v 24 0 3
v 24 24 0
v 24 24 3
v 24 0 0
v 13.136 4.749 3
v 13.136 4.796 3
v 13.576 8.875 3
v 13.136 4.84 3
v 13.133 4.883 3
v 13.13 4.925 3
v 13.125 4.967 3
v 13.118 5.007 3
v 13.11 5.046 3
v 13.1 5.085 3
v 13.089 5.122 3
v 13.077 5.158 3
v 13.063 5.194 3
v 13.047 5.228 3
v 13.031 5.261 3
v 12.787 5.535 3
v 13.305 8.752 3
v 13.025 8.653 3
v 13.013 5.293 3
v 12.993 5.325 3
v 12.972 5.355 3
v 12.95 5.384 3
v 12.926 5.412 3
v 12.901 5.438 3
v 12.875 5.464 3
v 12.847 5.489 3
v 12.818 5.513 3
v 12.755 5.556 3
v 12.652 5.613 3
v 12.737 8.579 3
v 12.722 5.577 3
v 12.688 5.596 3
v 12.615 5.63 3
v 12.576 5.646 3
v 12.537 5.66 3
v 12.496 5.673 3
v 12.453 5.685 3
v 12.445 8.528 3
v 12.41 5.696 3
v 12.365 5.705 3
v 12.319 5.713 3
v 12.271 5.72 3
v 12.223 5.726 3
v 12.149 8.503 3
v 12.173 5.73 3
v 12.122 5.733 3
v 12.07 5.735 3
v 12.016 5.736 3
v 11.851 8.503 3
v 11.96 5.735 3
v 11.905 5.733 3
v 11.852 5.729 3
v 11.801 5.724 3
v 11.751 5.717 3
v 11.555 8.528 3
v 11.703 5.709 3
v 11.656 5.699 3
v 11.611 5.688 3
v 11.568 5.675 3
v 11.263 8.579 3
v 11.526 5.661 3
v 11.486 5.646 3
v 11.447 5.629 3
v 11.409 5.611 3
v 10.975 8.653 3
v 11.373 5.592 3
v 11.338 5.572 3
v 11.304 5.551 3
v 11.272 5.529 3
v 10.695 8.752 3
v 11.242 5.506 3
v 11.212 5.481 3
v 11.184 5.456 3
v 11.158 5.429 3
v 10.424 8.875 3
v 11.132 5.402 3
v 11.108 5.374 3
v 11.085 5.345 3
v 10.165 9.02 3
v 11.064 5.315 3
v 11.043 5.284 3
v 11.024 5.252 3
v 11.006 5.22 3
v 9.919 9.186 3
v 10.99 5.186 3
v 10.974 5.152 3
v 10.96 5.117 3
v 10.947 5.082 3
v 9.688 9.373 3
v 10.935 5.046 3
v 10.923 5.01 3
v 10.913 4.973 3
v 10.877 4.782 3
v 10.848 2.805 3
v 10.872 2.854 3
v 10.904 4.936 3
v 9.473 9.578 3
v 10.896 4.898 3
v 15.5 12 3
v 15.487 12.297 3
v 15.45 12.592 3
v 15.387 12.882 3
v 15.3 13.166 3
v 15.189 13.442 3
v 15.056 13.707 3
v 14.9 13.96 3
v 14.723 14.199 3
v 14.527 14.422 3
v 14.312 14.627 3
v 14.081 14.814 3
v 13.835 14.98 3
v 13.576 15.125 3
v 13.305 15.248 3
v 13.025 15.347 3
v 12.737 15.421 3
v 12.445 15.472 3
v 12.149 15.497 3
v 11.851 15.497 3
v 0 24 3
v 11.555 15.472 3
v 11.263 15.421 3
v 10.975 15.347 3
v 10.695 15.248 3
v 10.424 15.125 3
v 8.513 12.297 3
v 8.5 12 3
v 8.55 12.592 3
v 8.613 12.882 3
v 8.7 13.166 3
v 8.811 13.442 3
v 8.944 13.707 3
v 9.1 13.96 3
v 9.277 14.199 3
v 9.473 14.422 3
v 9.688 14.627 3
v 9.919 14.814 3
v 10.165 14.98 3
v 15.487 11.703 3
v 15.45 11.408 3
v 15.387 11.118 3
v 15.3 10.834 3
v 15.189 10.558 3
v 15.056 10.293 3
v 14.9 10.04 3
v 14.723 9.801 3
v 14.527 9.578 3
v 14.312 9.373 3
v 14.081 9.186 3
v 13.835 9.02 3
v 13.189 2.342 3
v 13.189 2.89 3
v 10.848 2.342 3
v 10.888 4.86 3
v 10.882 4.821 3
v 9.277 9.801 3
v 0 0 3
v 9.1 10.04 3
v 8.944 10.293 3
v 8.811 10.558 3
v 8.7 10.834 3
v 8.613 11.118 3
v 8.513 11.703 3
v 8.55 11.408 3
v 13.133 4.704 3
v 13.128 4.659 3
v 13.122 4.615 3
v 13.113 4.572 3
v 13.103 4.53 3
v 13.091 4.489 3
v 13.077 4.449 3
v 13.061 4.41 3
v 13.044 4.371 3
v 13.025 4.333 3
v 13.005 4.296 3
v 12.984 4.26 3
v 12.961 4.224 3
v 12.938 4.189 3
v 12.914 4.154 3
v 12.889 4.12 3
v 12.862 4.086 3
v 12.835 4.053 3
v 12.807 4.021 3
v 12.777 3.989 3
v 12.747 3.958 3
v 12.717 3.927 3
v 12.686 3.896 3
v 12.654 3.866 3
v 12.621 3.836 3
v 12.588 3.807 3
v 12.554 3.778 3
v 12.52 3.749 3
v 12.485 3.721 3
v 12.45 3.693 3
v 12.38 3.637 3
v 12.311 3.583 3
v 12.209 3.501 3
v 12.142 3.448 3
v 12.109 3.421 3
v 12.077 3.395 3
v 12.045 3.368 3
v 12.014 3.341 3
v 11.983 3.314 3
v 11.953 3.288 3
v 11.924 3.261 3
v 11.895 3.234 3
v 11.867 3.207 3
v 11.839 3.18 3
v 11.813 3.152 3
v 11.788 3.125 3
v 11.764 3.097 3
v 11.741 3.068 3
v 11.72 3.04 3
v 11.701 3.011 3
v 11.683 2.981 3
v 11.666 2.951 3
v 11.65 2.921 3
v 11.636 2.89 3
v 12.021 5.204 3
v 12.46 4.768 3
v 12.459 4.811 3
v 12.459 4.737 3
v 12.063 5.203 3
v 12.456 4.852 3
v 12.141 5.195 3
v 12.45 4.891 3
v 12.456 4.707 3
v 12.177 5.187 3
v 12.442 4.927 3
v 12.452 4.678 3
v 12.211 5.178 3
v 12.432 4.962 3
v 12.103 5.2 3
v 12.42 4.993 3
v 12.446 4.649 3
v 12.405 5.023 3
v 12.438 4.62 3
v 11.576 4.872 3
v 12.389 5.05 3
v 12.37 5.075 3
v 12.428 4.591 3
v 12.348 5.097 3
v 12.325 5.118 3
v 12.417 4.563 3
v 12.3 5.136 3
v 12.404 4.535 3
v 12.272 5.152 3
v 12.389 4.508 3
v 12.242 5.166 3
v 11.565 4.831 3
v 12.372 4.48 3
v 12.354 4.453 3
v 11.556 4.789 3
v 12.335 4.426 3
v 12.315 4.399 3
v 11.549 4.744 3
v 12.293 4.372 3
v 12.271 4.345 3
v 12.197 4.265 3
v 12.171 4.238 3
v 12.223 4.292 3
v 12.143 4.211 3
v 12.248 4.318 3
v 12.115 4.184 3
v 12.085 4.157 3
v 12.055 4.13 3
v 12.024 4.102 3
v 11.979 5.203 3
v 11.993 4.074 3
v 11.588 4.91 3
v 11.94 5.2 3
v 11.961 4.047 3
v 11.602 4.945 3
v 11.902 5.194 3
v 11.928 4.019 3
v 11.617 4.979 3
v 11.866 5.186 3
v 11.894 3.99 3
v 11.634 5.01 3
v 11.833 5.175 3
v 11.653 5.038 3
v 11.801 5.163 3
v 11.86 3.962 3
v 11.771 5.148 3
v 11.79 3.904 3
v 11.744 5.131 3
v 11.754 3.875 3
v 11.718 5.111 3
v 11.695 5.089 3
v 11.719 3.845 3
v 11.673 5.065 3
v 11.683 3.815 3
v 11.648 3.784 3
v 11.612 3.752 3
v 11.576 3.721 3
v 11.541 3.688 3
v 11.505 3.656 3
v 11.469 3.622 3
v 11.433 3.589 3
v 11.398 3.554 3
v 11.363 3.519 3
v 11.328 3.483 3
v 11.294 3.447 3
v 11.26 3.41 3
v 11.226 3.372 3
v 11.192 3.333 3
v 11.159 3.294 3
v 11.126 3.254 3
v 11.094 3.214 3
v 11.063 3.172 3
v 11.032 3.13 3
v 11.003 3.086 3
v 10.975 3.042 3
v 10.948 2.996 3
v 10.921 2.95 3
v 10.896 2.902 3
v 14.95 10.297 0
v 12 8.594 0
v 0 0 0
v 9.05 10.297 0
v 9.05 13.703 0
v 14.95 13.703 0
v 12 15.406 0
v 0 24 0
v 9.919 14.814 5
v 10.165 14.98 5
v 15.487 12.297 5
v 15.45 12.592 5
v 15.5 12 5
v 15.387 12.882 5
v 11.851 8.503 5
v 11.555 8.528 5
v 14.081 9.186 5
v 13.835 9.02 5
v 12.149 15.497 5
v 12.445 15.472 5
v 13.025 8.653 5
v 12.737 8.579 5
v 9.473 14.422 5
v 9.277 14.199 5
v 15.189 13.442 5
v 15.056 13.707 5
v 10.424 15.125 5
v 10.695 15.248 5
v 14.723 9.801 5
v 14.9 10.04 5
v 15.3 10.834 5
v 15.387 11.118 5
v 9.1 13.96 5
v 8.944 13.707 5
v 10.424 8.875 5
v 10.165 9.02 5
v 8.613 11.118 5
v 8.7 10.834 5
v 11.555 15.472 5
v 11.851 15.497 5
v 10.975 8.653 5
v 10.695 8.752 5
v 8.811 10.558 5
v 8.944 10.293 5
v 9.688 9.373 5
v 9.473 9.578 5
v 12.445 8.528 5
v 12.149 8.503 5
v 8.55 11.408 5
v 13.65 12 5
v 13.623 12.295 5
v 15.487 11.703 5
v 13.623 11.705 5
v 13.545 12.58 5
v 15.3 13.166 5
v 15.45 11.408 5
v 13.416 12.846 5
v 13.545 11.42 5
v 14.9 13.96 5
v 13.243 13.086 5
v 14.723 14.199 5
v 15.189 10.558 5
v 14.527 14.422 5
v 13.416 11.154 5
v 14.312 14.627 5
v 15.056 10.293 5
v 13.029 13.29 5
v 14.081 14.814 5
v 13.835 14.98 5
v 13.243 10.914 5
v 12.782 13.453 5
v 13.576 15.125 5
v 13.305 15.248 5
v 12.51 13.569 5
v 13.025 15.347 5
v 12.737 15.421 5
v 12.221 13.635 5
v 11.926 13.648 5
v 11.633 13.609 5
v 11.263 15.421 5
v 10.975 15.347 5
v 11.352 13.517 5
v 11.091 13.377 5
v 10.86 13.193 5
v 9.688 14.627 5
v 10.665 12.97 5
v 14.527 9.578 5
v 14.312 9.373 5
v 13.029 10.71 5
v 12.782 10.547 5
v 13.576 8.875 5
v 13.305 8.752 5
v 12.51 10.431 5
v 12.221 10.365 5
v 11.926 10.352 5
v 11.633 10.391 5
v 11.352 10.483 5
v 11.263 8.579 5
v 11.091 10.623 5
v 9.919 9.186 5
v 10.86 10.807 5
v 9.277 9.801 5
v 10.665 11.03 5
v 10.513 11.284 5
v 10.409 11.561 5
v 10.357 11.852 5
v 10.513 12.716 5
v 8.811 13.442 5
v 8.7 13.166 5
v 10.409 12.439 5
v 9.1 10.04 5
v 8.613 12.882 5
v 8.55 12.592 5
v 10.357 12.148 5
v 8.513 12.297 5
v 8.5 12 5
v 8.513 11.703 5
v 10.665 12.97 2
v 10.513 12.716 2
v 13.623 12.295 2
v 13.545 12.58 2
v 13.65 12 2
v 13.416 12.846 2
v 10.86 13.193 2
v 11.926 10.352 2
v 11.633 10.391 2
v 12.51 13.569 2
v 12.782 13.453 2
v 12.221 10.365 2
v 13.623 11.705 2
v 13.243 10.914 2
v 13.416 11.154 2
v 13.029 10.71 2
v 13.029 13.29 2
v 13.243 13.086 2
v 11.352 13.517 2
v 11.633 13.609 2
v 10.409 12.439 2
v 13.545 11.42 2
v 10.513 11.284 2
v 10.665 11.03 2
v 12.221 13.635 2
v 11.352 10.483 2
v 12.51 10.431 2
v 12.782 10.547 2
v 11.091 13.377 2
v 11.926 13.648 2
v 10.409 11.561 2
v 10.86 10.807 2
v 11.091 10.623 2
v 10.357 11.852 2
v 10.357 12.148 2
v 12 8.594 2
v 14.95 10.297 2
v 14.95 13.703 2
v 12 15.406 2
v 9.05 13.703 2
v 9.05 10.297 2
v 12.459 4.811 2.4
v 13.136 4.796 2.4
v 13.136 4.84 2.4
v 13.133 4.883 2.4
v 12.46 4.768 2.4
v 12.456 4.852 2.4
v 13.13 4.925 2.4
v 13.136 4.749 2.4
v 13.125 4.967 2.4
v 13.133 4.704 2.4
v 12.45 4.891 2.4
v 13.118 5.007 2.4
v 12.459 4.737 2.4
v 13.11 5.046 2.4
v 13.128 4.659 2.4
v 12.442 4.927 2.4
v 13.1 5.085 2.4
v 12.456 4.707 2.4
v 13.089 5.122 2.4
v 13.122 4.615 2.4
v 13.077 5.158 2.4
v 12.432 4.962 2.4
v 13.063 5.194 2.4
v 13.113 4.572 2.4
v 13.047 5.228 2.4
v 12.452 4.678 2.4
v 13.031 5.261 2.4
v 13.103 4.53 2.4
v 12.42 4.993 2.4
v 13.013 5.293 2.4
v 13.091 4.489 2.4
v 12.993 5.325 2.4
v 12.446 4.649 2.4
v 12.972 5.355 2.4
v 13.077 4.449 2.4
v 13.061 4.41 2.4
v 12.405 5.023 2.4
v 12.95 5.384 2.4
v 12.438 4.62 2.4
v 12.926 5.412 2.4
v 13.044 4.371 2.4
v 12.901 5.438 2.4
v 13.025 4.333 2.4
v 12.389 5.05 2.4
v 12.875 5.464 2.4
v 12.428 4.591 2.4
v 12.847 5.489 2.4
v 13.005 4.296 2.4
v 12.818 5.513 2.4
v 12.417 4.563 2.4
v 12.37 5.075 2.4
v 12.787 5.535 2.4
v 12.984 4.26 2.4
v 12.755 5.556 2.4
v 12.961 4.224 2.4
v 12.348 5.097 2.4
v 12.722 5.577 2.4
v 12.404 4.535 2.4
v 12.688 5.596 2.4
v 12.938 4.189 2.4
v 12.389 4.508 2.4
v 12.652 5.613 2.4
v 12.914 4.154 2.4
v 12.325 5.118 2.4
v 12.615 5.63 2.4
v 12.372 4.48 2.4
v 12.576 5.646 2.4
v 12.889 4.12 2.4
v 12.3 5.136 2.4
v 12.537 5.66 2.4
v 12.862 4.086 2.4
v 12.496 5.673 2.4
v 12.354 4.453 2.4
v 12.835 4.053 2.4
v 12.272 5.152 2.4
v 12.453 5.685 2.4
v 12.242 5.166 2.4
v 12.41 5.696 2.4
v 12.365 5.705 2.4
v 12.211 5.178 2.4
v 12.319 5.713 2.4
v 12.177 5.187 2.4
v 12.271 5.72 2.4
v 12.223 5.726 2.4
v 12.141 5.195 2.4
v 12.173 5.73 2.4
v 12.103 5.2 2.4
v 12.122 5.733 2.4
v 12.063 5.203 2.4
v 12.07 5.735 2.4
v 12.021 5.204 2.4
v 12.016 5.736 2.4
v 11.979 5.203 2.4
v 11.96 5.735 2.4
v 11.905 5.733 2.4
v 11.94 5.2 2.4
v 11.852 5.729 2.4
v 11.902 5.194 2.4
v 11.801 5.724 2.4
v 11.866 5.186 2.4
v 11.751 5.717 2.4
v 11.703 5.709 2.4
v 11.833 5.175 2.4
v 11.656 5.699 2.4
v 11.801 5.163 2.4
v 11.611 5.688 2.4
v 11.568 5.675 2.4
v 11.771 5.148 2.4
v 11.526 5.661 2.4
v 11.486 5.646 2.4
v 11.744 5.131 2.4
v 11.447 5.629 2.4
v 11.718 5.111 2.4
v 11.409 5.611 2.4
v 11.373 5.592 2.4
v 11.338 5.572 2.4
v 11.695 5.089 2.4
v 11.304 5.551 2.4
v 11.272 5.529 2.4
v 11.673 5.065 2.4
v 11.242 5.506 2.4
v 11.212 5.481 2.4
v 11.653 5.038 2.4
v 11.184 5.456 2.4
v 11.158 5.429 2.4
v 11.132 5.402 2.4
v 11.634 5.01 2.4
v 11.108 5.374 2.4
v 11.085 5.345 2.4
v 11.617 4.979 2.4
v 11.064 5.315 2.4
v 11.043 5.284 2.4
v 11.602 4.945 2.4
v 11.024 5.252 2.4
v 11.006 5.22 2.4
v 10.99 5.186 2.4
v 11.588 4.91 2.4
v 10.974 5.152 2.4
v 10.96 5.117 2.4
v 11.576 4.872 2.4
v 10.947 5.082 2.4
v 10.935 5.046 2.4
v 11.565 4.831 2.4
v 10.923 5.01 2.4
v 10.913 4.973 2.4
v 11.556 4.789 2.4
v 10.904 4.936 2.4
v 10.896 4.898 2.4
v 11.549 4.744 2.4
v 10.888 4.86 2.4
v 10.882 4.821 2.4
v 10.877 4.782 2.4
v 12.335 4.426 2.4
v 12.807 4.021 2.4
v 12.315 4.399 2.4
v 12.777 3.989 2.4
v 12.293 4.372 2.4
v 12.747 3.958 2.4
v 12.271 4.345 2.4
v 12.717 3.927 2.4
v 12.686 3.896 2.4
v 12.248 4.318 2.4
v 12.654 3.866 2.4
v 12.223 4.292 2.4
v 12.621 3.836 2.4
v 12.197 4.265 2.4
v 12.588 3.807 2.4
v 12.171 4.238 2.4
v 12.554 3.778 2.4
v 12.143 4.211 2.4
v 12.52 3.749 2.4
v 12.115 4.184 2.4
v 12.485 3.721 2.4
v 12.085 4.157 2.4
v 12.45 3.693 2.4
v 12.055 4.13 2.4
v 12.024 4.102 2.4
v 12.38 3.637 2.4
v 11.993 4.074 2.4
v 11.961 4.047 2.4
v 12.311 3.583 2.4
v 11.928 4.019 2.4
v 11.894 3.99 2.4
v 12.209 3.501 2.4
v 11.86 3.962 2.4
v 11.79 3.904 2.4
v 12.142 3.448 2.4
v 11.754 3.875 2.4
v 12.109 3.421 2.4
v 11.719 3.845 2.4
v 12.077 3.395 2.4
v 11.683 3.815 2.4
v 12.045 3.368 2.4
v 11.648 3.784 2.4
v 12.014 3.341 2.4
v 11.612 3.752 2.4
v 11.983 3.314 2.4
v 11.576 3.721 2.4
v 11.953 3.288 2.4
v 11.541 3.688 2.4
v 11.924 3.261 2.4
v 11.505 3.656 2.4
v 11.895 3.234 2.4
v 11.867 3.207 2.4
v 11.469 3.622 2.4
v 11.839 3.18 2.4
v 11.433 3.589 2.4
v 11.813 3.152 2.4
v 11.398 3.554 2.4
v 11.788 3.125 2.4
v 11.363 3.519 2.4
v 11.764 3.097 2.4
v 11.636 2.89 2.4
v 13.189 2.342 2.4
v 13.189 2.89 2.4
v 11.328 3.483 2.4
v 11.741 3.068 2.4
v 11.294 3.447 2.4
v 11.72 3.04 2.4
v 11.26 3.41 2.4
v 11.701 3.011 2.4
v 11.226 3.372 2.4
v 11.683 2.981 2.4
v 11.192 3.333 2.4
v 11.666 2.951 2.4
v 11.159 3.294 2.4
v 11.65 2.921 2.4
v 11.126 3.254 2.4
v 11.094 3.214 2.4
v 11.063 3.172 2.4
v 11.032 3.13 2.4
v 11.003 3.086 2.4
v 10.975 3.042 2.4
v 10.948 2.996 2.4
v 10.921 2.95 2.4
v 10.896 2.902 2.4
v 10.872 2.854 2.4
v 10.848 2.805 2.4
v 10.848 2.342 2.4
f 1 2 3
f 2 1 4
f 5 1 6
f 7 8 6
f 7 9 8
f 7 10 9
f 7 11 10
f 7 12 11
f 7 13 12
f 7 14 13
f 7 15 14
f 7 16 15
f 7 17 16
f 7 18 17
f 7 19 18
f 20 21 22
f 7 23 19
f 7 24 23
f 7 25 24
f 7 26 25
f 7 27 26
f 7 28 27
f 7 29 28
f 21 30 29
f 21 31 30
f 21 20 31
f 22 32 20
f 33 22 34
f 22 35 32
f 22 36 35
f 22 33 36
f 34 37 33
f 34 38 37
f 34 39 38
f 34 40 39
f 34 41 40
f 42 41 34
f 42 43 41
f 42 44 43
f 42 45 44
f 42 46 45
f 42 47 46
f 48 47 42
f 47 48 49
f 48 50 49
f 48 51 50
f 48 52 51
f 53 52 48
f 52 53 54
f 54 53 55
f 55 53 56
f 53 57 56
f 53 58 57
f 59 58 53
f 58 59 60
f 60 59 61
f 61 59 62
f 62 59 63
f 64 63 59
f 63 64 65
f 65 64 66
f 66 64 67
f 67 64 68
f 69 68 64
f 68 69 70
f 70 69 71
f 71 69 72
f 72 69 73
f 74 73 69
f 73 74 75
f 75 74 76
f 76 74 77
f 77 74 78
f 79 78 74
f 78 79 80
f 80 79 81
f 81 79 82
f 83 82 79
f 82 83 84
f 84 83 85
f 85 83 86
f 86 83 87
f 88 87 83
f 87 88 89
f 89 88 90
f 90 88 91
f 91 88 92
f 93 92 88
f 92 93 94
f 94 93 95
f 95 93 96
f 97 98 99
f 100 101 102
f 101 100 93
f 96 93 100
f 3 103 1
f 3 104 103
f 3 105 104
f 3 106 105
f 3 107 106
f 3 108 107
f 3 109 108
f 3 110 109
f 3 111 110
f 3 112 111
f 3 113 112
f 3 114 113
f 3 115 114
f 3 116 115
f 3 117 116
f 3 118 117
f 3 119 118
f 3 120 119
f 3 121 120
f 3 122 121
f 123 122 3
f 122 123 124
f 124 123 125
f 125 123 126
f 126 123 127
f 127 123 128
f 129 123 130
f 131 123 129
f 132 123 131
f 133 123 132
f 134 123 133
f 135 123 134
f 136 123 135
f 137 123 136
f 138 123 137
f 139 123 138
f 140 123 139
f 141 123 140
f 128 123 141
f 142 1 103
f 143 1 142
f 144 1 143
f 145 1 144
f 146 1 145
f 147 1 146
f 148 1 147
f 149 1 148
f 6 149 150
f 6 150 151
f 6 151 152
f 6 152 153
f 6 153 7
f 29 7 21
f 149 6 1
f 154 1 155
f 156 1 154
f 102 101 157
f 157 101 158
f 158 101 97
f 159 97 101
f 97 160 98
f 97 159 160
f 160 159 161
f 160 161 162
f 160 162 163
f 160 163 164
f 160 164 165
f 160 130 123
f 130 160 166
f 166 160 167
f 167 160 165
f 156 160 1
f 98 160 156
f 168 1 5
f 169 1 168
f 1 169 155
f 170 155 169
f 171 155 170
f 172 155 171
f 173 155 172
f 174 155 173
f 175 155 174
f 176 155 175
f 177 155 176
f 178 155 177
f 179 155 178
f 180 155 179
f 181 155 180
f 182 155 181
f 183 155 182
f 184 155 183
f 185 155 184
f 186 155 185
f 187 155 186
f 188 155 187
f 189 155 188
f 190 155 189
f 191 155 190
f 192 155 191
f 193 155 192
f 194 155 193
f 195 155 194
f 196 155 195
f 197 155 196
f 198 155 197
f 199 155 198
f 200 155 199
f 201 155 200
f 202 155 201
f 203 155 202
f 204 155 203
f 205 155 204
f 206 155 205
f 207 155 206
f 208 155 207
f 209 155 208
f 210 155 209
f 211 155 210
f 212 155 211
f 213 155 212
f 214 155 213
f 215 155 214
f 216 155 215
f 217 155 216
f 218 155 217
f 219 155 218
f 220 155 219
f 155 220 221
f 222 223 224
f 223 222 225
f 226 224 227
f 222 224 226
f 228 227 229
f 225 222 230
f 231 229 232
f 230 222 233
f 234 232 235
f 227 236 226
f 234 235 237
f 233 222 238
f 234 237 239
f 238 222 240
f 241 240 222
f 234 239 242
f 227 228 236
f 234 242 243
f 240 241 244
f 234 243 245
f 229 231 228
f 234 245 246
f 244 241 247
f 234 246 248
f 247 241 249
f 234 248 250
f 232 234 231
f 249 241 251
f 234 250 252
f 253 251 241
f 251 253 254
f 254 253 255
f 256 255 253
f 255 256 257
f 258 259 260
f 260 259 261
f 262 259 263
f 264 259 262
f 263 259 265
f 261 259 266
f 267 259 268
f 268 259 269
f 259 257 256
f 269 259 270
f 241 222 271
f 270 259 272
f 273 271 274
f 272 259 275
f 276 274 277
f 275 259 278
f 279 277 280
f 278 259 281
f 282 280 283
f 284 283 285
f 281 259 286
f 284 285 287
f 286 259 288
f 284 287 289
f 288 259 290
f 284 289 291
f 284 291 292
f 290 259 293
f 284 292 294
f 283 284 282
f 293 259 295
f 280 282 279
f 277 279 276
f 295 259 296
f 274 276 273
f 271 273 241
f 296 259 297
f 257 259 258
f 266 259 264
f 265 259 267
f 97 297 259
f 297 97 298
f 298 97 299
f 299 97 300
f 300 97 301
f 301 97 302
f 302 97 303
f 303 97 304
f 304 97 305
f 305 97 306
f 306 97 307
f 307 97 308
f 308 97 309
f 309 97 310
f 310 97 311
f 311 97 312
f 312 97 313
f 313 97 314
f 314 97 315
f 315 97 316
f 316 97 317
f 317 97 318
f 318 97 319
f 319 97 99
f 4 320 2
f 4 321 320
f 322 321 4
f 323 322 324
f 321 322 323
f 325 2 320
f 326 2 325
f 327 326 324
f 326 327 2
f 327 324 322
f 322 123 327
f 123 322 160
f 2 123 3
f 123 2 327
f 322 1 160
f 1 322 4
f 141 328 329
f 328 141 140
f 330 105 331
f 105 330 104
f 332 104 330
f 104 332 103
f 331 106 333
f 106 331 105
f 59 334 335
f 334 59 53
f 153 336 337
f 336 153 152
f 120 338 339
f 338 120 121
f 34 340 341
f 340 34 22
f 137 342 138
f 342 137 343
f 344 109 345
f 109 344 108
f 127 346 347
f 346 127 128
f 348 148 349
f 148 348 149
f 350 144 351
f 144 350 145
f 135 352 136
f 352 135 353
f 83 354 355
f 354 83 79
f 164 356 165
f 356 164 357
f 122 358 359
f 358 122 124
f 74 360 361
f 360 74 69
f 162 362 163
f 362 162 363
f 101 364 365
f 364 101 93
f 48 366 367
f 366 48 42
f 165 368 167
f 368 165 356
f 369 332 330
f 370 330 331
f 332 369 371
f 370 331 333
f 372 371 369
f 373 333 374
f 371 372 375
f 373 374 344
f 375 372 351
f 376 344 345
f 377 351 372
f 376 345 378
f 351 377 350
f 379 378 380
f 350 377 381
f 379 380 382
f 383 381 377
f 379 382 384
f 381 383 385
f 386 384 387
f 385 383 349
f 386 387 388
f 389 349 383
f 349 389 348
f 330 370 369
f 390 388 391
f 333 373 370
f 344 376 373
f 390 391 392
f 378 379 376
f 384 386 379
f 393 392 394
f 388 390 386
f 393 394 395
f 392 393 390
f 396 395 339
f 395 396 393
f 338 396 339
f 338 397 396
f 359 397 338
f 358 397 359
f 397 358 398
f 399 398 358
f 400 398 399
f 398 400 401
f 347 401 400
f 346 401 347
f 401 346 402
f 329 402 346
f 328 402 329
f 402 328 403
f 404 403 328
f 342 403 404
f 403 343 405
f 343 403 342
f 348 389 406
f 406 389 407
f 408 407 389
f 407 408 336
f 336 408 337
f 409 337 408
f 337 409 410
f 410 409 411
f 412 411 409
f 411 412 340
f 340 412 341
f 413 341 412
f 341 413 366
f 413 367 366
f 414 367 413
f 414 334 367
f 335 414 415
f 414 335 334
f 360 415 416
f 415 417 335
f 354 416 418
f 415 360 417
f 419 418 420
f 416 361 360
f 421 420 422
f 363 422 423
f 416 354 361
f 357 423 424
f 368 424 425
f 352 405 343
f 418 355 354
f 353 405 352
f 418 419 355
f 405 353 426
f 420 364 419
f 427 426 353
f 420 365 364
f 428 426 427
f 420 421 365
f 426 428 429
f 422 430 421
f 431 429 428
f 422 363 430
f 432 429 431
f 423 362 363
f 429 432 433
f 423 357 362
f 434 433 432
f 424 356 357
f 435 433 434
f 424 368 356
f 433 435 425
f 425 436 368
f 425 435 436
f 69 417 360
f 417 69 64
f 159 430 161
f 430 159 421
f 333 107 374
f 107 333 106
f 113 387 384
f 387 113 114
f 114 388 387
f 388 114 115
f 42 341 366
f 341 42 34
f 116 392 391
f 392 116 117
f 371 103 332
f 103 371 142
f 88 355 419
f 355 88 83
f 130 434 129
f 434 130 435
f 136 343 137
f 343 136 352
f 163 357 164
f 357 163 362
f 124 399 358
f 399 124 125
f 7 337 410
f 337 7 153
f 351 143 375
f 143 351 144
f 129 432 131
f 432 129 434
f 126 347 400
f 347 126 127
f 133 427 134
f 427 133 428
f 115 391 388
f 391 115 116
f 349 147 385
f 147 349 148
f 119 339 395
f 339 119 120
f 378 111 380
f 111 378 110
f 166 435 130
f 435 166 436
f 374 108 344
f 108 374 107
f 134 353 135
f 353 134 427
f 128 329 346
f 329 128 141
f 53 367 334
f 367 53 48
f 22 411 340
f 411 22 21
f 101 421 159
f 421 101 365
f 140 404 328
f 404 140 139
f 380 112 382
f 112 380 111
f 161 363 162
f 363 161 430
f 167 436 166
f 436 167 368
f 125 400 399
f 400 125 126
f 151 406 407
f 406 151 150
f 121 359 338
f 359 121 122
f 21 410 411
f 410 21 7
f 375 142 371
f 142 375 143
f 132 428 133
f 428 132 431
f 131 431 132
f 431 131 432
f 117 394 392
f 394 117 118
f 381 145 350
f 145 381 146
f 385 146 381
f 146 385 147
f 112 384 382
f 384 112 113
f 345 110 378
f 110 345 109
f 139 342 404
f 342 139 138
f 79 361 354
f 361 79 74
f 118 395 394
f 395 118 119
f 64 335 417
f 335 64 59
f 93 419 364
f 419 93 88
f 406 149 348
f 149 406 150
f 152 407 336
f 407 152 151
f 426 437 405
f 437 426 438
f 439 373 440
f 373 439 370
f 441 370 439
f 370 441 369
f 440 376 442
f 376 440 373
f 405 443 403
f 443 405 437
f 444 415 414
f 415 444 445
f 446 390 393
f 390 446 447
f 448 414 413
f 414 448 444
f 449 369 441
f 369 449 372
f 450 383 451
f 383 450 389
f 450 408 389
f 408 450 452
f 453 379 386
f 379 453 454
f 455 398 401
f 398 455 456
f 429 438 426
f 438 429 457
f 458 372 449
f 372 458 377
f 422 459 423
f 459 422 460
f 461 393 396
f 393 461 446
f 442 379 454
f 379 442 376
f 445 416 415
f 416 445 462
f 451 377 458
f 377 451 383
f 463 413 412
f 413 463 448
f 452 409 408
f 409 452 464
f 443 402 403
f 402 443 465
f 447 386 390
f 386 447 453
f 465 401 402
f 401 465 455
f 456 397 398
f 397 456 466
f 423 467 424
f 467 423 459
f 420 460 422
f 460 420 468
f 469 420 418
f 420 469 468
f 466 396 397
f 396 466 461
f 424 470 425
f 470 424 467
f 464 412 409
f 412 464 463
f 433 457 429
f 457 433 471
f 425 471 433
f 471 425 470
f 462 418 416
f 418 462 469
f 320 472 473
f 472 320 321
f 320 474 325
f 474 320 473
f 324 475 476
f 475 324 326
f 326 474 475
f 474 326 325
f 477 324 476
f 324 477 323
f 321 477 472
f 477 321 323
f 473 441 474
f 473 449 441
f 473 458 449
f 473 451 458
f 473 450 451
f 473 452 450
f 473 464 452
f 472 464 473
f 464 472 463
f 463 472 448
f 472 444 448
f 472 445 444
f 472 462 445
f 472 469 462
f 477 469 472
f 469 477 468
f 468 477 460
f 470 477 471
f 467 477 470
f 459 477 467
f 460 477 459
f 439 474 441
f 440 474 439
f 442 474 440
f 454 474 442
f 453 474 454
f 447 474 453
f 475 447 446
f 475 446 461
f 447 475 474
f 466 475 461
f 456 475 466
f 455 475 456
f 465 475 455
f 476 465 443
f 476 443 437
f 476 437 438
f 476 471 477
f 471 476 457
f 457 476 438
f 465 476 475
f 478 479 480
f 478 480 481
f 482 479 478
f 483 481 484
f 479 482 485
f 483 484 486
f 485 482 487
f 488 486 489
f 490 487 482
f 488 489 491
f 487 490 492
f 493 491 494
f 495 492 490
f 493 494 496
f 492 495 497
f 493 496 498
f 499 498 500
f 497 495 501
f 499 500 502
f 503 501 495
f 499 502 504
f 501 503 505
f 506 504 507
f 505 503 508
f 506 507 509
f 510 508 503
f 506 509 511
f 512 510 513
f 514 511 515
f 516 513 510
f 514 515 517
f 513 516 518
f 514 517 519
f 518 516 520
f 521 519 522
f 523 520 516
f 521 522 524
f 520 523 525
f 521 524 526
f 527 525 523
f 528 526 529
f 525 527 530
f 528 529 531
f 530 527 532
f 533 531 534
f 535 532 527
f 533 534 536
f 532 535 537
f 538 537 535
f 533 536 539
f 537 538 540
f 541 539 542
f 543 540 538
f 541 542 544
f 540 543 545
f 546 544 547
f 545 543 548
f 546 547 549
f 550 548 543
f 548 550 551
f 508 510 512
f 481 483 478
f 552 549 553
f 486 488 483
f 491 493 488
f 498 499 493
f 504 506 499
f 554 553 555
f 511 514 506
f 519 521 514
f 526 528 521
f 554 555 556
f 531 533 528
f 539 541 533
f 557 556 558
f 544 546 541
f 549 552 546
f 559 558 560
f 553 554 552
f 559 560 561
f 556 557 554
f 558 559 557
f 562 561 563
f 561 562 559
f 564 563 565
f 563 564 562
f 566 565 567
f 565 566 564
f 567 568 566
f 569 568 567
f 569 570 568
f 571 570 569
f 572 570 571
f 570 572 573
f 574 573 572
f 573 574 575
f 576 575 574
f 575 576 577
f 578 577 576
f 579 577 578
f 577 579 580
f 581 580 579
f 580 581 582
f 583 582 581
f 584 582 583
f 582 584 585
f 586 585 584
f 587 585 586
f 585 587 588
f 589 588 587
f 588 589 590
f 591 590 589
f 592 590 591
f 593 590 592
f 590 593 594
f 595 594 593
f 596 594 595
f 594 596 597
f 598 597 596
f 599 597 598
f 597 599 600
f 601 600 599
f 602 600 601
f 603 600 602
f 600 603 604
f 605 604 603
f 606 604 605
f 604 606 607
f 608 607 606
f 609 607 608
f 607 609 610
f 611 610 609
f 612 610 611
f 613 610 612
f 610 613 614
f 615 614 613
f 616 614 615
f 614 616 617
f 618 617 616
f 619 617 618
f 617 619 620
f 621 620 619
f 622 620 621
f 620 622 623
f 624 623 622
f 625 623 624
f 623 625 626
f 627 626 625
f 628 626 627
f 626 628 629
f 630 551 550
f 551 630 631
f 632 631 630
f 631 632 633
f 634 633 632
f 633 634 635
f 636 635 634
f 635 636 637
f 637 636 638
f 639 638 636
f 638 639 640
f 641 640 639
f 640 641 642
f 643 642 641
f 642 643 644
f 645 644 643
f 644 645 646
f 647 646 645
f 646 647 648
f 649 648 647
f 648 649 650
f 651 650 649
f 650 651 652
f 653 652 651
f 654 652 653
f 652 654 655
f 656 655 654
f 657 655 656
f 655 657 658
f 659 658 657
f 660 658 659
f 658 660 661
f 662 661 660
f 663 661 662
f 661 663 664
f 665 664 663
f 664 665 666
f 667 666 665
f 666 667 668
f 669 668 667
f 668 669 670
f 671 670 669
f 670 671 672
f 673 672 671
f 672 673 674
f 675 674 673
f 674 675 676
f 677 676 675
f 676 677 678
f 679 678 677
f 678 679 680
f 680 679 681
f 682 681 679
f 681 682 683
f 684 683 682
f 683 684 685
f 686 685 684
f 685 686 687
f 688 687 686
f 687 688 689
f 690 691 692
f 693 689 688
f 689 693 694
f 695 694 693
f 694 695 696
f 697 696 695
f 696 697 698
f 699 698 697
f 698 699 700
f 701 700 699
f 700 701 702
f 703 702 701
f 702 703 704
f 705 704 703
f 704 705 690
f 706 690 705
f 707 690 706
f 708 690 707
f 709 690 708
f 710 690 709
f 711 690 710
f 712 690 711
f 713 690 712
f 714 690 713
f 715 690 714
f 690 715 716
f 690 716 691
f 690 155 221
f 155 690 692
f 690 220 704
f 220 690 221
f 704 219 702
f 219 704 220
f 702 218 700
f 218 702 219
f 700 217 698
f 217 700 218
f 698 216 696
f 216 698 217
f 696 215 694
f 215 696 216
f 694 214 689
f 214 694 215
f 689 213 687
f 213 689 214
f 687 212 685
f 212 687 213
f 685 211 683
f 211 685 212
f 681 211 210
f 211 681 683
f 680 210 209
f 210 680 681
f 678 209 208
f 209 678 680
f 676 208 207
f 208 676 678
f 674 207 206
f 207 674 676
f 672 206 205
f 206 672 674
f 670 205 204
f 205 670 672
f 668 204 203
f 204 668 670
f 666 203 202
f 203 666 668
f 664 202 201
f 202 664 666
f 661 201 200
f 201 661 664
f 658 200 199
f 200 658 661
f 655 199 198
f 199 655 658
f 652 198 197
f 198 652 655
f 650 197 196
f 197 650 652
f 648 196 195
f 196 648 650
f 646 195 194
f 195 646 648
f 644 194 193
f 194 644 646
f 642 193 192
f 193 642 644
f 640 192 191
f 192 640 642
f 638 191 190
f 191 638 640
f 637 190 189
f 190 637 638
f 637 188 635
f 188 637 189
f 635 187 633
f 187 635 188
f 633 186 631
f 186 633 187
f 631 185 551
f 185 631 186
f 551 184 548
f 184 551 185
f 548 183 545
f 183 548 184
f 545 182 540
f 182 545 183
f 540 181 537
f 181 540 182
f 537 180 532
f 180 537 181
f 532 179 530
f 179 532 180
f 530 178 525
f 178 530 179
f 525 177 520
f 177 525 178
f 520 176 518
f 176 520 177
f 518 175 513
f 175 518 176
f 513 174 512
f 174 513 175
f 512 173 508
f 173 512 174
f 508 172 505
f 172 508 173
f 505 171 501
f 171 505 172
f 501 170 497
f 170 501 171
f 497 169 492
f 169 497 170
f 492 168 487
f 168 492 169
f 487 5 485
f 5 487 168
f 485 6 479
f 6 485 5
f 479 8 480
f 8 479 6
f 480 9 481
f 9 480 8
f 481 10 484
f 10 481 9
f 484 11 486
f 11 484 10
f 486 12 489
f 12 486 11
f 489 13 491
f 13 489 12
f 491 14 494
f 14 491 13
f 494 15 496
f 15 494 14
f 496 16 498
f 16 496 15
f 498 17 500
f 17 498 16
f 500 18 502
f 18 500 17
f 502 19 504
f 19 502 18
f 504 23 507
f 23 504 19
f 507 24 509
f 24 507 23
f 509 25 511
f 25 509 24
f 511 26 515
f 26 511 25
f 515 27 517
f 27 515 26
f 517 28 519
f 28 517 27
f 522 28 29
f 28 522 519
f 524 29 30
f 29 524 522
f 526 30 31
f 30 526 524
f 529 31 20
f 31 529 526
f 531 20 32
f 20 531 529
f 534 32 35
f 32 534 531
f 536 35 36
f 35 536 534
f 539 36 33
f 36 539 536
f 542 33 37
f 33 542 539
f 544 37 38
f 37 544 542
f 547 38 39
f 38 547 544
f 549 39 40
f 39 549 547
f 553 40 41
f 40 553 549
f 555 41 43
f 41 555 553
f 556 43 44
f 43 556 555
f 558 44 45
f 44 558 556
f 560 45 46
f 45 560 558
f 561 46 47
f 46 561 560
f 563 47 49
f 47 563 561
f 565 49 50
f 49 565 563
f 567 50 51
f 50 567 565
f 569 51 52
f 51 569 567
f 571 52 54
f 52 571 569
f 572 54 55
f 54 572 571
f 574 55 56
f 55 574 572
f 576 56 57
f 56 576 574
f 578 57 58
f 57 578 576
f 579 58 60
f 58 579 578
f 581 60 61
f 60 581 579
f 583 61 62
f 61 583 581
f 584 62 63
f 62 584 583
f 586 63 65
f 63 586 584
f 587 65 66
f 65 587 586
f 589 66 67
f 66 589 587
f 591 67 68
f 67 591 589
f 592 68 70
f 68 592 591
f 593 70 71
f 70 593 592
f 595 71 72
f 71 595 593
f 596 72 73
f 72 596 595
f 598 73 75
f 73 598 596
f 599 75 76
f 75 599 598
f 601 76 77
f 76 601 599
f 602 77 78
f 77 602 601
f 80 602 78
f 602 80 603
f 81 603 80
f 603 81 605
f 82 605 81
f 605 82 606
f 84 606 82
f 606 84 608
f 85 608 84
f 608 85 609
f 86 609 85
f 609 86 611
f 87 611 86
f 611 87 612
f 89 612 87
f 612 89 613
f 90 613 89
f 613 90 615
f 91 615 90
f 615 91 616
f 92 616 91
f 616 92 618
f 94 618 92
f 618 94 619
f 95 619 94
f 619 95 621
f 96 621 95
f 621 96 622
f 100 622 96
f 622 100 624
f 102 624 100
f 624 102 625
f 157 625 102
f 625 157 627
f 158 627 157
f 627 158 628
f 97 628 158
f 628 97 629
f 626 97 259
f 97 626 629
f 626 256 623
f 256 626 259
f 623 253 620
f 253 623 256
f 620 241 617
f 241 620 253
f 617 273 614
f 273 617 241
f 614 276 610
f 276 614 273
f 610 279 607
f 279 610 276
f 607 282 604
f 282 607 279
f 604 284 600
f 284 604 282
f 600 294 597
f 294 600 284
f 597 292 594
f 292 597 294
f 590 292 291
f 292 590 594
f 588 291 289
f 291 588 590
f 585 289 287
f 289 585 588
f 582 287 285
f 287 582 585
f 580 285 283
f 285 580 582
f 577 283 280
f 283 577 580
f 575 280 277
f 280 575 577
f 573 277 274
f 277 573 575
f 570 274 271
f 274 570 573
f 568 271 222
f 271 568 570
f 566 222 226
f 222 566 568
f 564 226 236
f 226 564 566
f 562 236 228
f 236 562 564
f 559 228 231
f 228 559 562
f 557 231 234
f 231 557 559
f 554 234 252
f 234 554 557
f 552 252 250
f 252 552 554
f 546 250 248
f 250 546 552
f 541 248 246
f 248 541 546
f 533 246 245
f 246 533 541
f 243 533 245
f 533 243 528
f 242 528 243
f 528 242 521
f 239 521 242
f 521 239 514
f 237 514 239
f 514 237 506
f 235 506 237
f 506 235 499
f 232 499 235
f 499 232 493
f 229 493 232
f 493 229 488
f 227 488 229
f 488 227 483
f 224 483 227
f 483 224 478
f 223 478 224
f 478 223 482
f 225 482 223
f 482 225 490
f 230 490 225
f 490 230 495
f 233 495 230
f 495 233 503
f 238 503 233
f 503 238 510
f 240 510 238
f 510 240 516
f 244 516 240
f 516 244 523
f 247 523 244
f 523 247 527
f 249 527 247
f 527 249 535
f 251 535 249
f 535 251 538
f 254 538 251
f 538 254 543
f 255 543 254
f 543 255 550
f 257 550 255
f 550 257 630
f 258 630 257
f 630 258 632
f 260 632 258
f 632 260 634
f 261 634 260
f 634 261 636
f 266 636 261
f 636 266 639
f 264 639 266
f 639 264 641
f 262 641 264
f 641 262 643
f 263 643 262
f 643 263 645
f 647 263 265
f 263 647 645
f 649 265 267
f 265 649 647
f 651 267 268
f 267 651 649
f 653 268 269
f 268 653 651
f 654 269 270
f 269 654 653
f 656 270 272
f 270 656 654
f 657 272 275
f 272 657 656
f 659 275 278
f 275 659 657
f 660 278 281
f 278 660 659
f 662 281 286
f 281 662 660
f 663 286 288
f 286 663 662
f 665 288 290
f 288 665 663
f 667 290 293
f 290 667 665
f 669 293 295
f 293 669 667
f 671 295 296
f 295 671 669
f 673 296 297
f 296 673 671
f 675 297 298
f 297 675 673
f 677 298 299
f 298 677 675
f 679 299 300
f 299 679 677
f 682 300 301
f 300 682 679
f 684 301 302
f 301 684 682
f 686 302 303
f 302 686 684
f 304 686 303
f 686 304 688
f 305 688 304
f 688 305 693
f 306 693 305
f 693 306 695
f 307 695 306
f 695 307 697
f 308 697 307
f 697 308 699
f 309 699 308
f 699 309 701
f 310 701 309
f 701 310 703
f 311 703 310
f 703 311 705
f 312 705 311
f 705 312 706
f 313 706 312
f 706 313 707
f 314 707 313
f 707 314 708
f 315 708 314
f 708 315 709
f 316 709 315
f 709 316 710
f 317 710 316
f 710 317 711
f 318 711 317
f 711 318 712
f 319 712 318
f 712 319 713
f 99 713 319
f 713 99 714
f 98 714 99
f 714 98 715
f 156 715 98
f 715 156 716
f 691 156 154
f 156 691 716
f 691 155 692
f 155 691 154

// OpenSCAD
// file: ../lib/common.scad
// Shared print, fastener and helper definitions. Units mm.

$fa = 4;
$fs = 0.3;

eps = 0.01;

// Added to the diameter of holes, seats and press fits. Tune after the test prints.
clearance = 0.2;
wall_min = 1.6;
layer_h = 0.2;
bed_size = [180, 180, 180];

pcb_thickness = 1.6;
base_plate_t = 3;
// Under the PCB for through-hole leads and solder. Set from the vehicle PCB, see docs/measurements.md.
pcb_standoff_h = 2;

// ISO 4032 nuts, nominal.
m3_d = 3;
m3_nut_af = 5.5;
m3_nut_h = 2.4;
// From test/m3_fit (screw hole column 3, nut trap column 4).
m3_cl = 0.3;
m3_nut_cl = 0.4;
// Plate left above a nut trapped in the base plate bottom, so the nut does not pull
// through; the nut sticks out below the plate by the rest.
nut_roof = 1;

label_font = "Liberation Sans:style=Bold";

// Vertical hole from z = 0 to z = h.
module hole(d, h, cl = clearance) {
    translate([0, 0, -eps]) cylinder(d = d + cl, h = h + 2 * eps);
}

// Hex pocket from z = 0 to z = h, two flats parallel to X.
module nut_trap(af, h, cl = clearance) {
    translate([0, 0, -eps]) rotate([0, 0, 30])
        cylinder(d = (af + cl) / cos(30), h = h + eps, $fn = 6);
}

// Hole along +Y from y = 0 to y = h with a 45 deg roof pointing +Z,
// so it prints without support when the part's +Z is up on the printer.
module teardrop(d, h, cl = clearance) {
    r = (d + cl) / 2;
    rotate([90, 0, 0]) translate([0, 0, -h - eps])
        linear_extrude(h + 2 * eps) hull() {
            circle(r);
            translate([0, r * sqrt(2) - eps]) square(2 * eps, center = true);
        }
}

// Engraved label, top face at z = 0.
module label(txt, size = 4, depth = 0.6) {
    translate([0, 0, -depth]) linear_extrude(depth + eps)
        text(txt, size = size, font = label_font, halign = "center", valign = "center");
}

// Row from the generated pcb_*.scad parts table by element name.
function pcb_part(parts, name) = parts[search([name], parts)[0]];
// main file
// PCB standoff on a piece of base plate. M3 screw from the top through the PCB,
// nut trapped in the plate bottom. Checks the standoff height under the PCB leads.

include <../lib/common.scad>

standoff_d = 7;
plate = [24, 24, base_plate_t];

difference() {
    union() {
        cube(plate);
        translate([plate.x / 2, plate.y / 2, 0]) cylinder(d = standoff_d, h = plate.z + pcb_standoff_h);
    }
    translate([plate.x / 2, plate.y / 2, 0]) {
        hole(m3_d, plate.z + pcb_standoff_h, m3_cl);
        nut_trap(m3_nut_af, plate.z - nut_roof, m3_nut_cl);
    }
    translate([plate.x / 2, 4, plate.z]) label(str(pcb_standoff_h), size = 3.5);
}
